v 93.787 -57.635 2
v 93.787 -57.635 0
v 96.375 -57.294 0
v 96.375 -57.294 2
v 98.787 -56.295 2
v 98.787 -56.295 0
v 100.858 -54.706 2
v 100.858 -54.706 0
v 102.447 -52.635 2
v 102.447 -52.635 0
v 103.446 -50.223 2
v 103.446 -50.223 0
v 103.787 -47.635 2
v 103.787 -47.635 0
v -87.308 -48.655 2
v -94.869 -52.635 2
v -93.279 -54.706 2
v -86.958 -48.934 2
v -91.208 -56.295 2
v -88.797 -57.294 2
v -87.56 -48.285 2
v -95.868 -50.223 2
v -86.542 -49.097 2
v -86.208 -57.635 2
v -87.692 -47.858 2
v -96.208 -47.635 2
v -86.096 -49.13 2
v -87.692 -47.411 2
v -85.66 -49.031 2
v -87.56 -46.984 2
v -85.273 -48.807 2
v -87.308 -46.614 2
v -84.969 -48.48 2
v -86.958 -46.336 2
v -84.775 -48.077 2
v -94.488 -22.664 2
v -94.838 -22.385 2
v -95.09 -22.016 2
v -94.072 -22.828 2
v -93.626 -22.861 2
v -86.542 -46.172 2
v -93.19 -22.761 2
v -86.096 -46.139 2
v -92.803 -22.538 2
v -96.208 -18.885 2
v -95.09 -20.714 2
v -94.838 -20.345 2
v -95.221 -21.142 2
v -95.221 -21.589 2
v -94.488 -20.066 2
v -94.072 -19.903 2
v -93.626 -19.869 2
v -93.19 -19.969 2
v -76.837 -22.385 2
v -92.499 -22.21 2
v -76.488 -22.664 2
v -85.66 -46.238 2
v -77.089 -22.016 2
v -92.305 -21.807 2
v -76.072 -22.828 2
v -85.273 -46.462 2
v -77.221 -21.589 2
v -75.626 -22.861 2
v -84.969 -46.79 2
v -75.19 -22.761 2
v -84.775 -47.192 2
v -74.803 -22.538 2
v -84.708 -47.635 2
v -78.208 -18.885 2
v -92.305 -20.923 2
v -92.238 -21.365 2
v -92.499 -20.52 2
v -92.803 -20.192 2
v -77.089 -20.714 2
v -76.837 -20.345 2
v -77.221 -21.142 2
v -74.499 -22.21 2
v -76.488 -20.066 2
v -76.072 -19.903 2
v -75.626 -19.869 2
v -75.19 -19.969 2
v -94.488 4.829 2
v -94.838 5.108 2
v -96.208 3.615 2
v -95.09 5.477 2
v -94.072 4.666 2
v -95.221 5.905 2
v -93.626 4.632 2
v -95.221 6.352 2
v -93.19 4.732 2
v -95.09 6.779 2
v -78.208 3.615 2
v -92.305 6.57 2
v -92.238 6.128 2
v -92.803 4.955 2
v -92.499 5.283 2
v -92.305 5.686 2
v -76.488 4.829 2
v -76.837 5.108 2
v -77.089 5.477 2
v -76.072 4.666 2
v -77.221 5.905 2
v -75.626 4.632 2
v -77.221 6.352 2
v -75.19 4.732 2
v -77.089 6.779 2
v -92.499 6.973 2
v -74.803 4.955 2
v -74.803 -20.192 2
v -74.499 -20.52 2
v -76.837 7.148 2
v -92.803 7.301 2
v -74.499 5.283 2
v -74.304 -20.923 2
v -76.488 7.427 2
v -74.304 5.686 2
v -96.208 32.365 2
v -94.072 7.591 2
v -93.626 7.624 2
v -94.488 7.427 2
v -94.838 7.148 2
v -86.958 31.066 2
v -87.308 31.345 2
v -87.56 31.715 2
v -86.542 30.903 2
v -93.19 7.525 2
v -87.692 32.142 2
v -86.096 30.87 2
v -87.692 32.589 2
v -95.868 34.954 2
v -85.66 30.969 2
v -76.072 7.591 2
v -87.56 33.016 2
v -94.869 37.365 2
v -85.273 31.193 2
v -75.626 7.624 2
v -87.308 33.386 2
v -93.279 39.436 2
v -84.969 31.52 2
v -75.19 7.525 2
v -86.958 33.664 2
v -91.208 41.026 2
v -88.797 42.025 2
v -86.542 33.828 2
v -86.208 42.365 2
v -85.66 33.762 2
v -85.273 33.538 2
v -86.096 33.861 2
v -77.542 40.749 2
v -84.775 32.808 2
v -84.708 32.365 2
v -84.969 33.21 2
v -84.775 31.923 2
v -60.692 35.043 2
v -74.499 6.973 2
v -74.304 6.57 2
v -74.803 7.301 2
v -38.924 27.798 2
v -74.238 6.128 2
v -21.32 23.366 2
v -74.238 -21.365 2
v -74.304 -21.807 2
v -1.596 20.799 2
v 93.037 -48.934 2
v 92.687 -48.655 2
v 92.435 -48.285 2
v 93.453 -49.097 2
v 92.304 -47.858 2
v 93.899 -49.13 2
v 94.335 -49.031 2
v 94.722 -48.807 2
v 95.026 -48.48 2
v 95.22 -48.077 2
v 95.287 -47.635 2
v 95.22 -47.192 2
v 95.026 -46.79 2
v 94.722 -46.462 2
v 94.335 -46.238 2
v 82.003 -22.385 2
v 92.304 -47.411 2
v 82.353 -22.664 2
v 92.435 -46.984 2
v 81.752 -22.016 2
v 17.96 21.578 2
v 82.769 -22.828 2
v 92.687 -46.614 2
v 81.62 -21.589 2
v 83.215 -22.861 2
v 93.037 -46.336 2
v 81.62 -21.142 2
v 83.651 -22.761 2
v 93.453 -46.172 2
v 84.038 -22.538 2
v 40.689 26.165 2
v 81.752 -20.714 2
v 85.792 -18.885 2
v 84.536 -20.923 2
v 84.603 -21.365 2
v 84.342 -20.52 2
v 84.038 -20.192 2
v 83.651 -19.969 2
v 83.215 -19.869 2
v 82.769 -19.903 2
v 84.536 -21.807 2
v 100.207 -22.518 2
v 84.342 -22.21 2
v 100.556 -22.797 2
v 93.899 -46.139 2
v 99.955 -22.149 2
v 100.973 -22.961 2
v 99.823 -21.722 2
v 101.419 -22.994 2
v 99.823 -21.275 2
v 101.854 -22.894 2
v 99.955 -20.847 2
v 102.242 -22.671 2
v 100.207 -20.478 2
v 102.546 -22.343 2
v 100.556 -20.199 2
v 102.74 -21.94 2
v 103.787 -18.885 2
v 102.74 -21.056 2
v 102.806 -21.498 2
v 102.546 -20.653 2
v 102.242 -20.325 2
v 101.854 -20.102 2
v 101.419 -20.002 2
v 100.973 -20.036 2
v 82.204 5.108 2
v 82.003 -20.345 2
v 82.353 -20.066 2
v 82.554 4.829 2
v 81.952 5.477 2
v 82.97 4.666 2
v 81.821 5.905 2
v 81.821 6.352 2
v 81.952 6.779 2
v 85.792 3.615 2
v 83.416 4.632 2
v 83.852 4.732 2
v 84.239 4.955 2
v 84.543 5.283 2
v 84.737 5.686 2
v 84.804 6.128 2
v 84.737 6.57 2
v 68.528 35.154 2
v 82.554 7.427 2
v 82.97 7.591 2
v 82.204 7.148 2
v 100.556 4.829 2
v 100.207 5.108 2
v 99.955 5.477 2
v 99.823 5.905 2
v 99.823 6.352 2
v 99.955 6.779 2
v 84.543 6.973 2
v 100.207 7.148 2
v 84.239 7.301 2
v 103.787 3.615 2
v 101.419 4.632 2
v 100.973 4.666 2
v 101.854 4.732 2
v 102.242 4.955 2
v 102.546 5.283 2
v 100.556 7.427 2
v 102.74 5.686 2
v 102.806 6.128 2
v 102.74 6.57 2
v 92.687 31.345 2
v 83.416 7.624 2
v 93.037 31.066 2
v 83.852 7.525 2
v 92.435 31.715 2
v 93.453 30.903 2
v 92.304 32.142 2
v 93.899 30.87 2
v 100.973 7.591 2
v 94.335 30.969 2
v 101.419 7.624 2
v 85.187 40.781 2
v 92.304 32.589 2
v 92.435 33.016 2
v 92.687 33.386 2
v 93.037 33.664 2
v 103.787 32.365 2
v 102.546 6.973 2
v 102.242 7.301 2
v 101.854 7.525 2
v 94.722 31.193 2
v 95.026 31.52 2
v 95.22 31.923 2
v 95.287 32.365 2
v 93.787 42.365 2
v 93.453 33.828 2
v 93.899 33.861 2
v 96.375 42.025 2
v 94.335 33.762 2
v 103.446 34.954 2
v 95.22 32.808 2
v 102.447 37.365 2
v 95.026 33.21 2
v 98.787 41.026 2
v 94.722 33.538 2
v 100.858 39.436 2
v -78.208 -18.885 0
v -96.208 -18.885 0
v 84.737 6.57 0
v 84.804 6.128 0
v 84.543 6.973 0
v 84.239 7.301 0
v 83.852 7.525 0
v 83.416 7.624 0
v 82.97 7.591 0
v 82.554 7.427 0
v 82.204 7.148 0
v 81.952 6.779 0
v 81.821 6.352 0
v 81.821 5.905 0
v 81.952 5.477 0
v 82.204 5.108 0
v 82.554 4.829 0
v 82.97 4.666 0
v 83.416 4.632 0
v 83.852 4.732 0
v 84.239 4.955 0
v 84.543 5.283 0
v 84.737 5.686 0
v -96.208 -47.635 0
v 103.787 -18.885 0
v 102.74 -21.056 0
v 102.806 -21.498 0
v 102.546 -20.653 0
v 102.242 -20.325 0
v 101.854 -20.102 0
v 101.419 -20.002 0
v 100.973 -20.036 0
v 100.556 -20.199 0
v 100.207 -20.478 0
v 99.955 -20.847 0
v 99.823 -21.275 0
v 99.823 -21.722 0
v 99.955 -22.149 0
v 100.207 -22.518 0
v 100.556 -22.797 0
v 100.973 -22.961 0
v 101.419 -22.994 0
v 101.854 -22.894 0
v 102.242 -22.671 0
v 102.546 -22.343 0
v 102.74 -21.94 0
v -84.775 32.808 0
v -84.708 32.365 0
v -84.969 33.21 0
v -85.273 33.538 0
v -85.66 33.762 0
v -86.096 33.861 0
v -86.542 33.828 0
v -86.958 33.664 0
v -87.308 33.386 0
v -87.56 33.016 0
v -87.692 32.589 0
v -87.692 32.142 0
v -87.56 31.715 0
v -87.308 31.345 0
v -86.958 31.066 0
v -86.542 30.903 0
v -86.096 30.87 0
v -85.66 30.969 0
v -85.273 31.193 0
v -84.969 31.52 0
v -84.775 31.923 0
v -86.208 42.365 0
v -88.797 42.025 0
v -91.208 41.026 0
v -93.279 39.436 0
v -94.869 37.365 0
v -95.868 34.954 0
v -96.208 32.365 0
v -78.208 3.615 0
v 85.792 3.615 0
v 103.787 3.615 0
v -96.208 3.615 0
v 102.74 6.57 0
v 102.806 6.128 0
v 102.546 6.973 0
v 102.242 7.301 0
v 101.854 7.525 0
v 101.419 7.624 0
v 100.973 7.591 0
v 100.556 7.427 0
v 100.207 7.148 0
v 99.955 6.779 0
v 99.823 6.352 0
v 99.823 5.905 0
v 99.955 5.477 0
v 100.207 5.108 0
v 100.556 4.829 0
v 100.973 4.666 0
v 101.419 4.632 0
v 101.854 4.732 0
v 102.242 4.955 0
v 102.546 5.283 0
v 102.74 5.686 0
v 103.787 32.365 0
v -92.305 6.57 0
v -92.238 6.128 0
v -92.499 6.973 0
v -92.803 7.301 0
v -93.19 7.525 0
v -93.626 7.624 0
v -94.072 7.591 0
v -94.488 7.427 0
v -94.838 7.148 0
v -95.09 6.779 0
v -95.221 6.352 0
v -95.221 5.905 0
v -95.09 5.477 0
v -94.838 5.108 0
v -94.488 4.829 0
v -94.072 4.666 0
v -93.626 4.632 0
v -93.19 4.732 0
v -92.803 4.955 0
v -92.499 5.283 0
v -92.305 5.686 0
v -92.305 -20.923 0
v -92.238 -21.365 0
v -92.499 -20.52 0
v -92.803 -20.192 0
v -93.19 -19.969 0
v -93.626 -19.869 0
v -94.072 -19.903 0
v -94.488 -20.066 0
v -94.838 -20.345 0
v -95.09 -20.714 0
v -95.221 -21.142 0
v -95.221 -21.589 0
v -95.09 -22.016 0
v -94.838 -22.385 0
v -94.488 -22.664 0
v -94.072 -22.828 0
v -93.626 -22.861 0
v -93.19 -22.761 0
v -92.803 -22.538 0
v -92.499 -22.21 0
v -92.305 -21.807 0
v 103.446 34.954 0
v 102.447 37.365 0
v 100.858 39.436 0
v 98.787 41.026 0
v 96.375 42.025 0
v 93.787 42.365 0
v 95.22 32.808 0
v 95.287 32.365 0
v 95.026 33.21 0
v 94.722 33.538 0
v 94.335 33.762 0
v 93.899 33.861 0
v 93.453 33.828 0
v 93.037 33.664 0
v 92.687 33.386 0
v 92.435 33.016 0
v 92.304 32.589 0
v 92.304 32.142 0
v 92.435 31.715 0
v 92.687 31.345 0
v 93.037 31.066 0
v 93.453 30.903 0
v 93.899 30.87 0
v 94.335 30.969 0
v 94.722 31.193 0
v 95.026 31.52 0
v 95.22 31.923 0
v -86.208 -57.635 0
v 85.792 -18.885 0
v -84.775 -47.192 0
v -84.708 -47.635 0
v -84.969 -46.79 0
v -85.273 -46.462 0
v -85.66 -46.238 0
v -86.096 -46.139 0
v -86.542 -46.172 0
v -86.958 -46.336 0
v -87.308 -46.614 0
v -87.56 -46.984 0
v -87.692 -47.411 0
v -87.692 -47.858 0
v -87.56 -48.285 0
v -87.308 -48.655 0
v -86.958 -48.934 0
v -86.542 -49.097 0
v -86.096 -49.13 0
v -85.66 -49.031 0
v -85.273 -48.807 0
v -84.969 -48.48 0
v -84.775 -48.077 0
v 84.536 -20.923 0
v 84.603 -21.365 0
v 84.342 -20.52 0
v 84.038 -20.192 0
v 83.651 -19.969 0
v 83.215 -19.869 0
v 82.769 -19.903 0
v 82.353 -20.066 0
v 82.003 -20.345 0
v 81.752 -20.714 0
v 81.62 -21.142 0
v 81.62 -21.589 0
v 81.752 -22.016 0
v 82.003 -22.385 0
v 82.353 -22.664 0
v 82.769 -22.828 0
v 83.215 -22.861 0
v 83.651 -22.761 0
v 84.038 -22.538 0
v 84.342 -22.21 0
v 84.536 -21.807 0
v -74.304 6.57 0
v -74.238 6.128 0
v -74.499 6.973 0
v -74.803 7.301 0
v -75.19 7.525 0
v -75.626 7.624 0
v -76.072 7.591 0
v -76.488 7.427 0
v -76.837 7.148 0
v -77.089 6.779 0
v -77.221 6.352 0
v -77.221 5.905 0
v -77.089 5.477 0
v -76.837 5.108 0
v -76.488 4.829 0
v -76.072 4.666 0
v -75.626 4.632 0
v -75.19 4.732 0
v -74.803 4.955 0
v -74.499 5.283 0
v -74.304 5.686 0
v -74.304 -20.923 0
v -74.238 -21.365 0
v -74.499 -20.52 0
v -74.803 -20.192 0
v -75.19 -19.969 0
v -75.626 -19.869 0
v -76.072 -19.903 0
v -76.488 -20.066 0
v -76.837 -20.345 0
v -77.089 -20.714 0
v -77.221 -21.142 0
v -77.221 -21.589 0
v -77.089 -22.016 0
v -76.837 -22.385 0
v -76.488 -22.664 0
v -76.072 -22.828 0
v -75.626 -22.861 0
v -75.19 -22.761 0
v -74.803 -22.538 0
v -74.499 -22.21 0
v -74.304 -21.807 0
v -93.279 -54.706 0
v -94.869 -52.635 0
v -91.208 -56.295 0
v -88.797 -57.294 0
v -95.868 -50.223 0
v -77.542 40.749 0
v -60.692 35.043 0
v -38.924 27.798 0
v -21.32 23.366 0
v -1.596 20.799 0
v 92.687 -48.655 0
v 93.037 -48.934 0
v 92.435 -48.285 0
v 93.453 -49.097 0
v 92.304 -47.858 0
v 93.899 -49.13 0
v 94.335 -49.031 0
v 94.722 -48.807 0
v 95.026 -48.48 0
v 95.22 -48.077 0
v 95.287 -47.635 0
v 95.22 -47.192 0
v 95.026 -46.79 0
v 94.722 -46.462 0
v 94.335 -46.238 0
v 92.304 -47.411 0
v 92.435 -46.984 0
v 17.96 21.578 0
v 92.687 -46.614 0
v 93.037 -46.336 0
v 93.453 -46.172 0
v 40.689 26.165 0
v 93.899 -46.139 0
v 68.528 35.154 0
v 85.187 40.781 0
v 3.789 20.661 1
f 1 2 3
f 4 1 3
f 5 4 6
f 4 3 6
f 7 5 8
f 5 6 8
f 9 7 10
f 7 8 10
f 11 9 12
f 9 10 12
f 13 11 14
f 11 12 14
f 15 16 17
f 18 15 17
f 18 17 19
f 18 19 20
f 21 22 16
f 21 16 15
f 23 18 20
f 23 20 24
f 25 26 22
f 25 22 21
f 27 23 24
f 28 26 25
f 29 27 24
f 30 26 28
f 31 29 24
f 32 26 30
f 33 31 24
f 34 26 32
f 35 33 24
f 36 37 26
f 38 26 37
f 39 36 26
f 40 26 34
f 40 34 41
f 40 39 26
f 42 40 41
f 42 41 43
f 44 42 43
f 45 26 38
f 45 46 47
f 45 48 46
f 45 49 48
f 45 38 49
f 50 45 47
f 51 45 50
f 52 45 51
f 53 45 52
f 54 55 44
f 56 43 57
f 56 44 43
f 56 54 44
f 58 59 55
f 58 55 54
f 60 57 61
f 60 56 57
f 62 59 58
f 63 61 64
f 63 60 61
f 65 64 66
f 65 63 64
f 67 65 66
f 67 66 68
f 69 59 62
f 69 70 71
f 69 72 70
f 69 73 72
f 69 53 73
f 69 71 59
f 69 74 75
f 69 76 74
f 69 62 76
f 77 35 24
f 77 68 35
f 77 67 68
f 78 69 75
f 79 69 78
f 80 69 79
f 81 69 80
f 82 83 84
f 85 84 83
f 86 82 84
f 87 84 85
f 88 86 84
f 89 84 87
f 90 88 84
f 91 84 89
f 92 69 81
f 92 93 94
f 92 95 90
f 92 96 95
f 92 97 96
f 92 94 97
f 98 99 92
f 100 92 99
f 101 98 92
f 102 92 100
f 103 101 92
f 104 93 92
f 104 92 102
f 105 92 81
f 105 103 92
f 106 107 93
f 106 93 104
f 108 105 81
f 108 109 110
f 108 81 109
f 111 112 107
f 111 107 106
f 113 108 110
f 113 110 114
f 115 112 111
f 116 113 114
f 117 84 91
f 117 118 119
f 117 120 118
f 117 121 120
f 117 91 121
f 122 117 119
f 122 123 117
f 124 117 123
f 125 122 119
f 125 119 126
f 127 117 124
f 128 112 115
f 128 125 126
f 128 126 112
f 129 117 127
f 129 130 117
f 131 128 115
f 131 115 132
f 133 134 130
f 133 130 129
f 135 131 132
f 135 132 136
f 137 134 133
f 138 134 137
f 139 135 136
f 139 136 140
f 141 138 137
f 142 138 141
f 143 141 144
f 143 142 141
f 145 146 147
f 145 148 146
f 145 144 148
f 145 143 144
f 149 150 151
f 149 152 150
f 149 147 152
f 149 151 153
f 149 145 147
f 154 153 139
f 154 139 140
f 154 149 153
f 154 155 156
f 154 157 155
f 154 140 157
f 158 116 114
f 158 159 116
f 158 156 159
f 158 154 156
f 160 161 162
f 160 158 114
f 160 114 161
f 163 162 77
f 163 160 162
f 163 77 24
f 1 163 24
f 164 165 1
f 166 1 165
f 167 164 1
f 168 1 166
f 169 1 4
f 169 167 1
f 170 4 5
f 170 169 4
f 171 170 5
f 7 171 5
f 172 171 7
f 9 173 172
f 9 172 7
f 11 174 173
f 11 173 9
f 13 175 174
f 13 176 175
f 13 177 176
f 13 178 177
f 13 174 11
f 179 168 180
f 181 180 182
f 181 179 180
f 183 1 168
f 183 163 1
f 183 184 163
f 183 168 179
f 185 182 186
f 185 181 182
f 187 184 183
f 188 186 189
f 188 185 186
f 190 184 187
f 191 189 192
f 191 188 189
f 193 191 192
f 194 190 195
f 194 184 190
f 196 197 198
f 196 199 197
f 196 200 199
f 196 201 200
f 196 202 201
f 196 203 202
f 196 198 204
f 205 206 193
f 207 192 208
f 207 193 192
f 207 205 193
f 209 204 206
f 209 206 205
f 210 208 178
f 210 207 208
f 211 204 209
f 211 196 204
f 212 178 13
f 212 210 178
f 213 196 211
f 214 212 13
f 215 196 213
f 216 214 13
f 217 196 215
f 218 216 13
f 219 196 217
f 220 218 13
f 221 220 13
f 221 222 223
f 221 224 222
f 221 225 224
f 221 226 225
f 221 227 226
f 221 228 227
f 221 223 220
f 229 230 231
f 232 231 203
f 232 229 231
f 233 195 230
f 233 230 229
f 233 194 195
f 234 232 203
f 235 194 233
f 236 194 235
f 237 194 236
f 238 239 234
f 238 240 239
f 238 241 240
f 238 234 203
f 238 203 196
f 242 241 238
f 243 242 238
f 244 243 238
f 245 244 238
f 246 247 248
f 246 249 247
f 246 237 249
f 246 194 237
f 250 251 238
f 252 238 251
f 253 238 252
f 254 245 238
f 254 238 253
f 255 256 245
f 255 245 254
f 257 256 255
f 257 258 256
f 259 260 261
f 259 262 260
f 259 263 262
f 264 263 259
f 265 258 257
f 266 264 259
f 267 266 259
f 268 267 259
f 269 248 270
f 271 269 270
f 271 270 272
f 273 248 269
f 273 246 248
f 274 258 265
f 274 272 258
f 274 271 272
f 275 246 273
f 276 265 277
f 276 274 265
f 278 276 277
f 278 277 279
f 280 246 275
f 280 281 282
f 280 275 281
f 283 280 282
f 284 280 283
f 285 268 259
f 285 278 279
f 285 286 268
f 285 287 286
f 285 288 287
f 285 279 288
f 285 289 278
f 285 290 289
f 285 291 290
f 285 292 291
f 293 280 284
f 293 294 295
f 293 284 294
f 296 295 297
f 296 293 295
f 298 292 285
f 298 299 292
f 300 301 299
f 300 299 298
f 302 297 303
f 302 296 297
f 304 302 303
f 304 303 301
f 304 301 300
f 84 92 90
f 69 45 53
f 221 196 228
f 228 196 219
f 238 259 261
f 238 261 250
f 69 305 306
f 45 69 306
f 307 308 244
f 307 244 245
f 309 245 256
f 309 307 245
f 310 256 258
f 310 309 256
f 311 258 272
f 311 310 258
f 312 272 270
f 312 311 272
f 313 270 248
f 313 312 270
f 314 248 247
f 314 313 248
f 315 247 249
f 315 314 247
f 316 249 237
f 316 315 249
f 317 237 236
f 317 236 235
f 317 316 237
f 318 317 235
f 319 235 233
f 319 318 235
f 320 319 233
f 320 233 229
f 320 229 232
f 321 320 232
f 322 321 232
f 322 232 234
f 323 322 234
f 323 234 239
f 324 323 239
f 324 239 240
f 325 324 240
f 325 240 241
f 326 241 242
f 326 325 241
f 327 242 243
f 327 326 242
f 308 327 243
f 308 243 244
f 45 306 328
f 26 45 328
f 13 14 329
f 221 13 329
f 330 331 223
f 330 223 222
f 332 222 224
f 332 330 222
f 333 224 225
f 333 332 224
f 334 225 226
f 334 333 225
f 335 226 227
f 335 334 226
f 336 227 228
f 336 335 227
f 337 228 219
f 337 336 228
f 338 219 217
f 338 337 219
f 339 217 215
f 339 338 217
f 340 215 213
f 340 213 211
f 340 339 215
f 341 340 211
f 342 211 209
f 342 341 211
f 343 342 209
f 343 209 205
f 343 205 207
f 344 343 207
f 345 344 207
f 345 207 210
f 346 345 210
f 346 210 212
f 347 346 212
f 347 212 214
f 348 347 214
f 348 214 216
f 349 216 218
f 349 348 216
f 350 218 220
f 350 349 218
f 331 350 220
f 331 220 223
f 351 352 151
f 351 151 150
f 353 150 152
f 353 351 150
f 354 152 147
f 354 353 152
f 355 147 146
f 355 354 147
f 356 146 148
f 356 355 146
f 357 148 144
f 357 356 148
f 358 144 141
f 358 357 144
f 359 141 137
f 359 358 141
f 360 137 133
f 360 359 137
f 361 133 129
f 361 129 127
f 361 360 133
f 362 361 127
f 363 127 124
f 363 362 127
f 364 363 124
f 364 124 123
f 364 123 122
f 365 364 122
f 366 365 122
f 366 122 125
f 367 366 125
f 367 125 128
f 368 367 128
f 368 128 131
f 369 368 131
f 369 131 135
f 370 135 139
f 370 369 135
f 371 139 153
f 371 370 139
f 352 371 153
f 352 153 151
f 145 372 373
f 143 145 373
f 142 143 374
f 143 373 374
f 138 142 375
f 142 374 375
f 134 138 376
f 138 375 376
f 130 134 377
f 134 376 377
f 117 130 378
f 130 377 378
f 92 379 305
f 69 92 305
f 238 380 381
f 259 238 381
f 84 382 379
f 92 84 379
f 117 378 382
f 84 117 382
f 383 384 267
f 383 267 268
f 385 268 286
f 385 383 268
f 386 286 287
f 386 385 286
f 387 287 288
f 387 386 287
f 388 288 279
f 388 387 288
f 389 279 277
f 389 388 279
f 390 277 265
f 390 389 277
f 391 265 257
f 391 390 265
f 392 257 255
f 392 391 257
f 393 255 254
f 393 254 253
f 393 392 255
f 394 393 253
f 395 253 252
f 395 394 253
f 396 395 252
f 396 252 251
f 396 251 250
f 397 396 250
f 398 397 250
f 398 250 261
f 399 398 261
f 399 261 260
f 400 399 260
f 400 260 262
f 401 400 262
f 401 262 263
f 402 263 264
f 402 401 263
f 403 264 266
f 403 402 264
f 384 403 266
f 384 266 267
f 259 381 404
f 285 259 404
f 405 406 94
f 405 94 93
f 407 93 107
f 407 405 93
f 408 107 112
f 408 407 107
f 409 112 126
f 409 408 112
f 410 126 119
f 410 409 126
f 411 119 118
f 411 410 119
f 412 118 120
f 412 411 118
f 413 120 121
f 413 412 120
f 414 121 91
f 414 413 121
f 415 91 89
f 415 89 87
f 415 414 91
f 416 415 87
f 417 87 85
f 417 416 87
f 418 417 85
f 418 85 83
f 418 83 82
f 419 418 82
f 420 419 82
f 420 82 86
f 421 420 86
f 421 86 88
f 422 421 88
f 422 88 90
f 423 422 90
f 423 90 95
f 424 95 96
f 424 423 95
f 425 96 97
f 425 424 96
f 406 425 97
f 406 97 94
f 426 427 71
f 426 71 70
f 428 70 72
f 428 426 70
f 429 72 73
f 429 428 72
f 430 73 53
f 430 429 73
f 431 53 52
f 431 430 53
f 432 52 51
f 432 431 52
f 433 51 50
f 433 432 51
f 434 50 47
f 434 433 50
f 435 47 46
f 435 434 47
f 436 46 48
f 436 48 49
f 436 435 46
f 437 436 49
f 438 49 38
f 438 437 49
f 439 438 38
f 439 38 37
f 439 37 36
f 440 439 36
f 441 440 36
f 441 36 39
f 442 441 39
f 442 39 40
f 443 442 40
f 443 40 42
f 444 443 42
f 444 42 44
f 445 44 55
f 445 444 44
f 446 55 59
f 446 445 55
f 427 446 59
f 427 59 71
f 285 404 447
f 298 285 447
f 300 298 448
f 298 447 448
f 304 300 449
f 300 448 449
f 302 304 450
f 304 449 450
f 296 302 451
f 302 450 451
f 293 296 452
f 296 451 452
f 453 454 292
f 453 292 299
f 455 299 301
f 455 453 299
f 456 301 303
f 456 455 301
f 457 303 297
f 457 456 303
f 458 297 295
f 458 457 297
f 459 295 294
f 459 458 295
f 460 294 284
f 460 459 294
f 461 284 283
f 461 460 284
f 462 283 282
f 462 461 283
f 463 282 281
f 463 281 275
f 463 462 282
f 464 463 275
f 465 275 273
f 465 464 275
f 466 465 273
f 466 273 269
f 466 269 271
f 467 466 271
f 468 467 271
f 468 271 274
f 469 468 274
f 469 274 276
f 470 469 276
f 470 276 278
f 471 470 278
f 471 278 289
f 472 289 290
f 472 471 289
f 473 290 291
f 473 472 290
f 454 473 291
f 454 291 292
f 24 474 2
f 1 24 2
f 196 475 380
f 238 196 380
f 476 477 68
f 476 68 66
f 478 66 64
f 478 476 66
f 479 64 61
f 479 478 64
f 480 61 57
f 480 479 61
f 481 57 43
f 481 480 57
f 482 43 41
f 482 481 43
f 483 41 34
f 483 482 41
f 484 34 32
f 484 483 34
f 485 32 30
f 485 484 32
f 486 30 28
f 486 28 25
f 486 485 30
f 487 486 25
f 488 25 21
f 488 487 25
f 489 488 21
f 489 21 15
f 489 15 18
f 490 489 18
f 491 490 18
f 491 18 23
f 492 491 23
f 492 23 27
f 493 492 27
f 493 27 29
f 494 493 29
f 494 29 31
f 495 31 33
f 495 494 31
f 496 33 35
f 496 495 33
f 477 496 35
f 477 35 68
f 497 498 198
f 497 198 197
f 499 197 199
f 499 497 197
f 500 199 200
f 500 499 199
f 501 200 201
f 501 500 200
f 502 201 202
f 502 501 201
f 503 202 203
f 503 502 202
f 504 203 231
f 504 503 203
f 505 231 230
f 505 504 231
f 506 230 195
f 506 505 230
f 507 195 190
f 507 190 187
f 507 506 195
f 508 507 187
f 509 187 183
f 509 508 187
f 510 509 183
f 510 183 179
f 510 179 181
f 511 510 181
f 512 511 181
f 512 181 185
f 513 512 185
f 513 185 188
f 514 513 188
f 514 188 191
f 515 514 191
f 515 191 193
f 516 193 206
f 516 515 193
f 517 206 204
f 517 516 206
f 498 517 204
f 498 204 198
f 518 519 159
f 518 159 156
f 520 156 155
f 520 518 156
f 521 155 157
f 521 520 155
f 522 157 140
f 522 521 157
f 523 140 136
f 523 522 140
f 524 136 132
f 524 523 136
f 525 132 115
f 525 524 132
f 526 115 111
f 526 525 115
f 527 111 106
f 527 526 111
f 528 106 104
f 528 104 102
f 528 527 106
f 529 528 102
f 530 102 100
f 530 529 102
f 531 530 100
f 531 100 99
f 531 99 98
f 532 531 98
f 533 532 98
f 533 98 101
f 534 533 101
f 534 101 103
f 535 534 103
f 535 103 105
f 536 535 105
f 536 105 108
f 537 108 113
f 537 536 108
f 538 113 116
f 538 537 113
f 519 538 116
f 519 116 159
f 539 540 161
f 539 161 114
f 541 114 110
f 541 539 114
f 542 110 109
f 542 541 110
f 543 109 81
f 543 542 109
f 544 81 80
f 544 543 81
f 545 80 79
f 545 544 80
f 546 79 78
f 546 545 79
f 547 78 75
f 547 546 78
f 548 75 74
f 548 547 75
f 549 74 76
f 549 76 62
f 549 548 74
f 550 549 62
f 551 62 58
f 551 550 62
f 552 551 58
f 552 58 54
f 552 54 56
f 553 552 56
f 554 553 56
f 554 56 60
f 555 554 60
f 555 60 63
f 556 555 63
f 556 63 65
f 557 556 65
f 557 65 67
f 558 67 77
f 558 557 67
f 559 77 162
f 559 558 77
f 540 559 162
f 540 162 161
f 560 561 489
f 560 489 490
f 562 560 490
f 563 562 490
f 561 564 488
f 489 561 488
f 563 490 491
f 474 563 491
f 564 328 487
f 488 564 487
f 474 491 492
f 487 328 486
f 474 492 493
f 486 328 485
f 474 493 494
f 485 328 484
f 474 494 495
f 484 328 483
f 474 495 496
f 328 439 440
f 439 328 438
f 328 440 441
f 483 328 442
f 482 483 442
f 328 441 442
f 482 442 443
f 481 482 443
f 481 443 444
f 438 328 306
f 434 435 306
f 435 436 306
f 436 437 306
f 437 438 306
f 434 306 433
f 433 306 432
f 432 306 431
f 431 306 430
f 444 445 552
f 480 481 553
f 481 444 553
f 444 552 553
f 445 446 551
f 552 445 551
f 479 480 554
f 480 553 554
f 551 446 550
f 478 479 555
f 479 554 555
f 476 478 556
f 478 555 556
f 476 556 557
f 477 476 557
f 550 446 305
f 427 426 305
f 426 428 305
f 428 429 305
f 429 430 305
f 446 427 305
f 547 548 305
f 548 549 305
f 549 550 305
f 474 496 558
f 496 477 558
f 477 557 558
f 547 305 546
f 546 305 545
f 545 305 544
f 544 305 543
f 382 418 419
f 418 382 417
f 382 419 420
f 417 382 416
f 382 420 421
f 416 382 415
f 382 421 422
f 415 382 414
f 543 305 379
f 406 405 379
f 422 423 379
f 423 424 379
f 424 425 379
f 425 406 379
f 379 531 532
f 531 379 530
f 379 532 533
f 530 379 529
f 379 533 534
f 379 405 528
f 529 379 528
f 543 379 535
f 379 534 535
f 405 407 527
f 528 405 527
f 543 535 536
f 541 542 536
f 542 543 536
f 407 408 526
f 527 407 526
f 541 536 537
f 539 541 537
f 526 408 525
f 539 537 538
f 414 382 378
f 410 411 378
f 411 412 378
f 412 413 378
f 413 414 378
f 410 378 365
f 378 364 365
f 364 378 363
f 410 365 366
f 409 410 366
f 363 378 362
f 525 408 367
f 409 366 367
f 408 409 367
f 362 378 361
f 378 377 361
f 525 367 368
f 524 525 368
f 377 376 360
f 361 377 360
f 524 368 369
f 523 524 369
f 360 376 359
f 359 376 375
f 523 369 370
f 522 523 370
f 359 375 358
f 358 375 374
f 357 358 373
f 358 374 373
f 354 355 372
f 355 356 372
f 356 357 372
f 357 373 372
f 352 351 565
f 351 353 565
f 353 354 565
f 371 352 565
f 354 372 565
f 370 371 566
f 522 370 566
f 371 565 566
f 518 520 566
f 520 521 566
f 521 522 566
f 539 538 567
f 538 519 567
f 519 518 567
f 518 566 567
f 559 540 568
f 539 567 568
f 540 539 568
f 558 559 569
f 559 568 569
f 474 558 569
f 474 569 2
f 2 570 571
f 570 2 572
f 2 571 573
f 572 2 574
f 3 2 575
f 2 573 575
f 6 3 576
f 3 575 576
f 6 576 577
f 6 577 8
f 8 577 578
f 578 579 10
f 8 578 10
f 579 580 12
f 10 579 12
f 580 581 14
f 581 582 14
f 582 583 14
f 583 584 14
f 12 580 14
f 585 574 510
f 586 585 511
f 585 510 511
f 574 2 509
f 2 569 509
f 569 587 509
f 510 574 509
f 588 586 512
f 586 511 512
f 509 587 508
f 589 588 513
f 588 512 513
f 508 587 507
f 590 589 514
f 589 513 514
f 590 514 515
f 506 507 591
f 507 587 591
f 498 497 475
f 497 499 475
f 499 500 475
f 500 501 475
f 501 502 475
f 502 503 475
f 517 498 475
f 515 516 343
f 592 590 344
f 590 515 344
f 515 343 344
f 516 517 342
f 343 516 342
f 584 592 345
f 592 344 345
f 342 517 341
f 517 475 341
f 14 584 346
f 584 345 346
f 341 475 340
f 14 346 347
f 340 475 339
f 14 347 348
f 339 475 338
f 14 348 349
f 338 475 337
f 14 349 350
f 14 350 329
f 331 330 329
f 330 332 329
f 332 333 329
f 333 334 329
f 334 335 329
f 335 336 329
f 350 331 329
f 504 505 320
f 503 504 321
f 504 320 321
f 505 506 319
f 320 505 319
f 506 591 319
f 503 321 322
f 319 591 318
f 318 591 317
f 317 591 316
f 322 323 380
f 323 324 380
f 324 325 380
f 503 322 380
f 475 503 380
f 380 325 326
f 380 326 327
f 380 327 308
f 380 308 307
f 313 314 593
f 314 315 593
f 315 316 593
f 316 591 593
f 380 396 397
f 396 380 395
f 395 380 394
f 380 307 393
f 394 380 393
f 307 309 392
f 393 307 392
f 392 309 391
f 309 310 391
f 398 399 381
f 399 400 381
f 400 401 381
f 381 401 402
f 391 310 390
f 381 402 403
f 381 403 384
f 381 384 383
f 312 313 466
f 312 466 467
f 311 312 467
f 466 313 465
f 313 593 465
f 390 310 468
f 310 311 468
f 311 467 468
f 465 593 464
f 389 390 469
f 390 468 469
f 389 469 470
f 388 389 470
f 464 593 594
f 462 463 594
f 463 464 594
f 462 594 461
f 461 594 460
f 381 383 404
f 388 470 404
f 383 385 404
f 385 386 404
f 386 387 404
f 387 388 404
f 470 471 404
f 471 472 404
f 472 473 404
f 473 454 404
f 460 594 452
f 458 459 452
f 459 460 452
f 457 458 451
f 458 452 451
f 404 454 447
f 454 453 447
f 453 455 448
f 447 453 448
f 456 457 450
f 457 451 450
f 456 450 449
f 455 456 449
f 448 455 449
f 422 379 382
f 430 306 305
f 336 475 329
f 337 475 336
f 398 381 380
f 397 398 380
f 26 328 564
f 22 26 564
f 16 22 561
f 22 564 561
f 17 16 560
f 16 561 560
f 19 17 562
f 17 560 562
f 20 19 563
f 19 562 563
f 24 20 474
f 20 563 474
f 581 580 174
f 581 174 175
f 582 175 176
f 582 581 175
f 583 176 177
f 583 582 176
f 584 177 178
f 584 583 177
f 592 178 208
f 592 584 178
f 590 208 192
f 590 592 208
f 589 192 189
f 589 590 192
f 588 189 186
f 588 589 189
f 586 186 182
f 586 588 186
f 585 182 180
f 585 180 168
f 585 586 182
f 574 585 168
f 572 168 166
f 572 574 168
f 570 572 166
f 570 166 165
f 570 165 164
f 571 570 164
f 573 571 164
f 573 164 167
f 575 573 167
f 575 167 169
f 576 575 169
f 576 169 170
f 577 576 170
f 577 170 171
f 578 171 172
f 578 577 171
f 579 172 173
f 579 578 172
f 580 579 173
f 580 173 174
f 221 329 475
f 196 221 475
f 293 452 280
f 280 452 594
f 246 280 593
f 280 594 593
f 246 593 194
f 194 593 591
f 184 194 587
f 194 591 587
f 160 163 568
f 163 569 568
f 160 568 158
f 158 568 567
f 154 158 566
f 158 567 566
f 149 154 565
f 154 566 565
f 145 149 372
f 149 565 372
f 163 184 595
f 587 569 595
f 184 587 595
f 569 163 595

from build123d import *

# Parameters (mm, degrees)
SKETCH1_R           = 1.5
BOSS_EXTRUDE5_DEPTH = 2


with BuildPart() as part:
    # Sketch1 → Boss-Extrude5 (new body)
    with BuildSketch(Plane.XY):
        with BuildLine():
            Line((-96.208405317, 32.365381328), (-96.208405317, 3.615381328))
            Line((-96.208405317, 3.615381328), (-78.208405317, 3.615381328))
            Line((-78.208405317, 3.615381328), (-78.208405317, -7.634618672))
            Line((-78.208405317, -7.634618672), (-78.208405317, -18.884618672))
            Line((-78.208405317, -18.884618672), (-96.208405317, -18.884618672))
            Line((-96.208405317, -18.884618672), (-96.208405317, -47.634618672))
            ThreePointArc((-96.208405317, -47.634618672), (-93.279473129, -54.705686484), (-86.208405317, -57.634618672))
            Line((-86.208405317, -57.634618672), (93.786822591, -57.634618672))
            ThreePointArc((93.786822591, -57.634618672), (100.857890403, -54.705686484), (103.786822591, -47.634618672))
            Line((103.786822591, -47.634618672), (103.786822591, -18.884618672))
            Line((103.786822591, -18.884618672), (85.791594683, -18.884618672))
            Line((85.791594683, -18.884618672), (85.791594683, -7.634618672))
            Line((85.791594683, -7.634618672), (85.791594683, 3.615381328))
            Line((85.791594683, 3.615381328), (103.786822591, 3.615381328))
            Line((103.786822591, 3.615381328), (103.786822591, 32.365381328))
            ThreePointArc((103.786822591, 32.365381328), (100.857890403, 39.43644914), (93.786822591, 42.365381328))
            add(Edge.make_bspline(
                [(93.786822591, 42.365381328), (80.365609536, 42.377038483), (3.810151403, -1.044125651), (-72.829077796, 42.354133189), (-86.208405317, 42.365381328)],
                knots=[0, 0, 0, 0, 0.5, 1, 1, 1, 1], degree=3))
            ThreePointArc((-86.208405317, 42.365381328), (-93.279473129, 39.43644914), (-96.208405317, 32.365381328))
        make_face()
        with Locations((93.786822591, 32.365381328)):
            Circle(SKETCH1_R, mode=Mode.SUBTRACT)
        with Locations((-86.208405317, 32.365381328)):
            Circle(SKETCH1_R, mode=Mode.SUBTRACT)
        with Locations((-86.208405317, -47.634618672)):
            Circle(SKETCH1_R, mode=Mode.SUBTRACT)
        with Locations((101.306428837, 6.128192253)):
            Circle(SKETCH1_R, mode=Mode.SUBTRACT)
        with Locations((83.303914286, 6.128192253)):
            Circle(SKETCH1_R, mode=Mode.SUBTRACT)
        with Locations((83.103049409, -21.36518771)):
            Circle(SKETCH1_R, mode=Mode.SUBTRACT)
        with Locations((101.306428837, -21.498180437)):
            Circle(SKETCH1_R, mode=Mode.SUBTRACT)
        with Locations((-93.738164493, 6.128192253)):
            Circle(SKETCH1_R, mode=Mode.SUBTRACT)
        with Locations((-75.737858718, 6.128192253)):
            Circle(SKETCH1_R, mode=Mode.SUBTRACT)
        with Locations((-75.737858718, -21.36518771)):
            Circle(SKETCH1_R, mode=Mode.SUBTRACT)
        with Locations((-93.738164493, -21.36518771)):
            Circle(SKETCH1_R, mode=Mode.SUBTRACT)
        with Locations((93.786822591, -47.634618672)):
            Circle(SKETCH1_R, mode=Mode.SUBTRACT)
    extrude(amount=BOSS_EXTRUDE5_DEPTH)


solid = part.part
